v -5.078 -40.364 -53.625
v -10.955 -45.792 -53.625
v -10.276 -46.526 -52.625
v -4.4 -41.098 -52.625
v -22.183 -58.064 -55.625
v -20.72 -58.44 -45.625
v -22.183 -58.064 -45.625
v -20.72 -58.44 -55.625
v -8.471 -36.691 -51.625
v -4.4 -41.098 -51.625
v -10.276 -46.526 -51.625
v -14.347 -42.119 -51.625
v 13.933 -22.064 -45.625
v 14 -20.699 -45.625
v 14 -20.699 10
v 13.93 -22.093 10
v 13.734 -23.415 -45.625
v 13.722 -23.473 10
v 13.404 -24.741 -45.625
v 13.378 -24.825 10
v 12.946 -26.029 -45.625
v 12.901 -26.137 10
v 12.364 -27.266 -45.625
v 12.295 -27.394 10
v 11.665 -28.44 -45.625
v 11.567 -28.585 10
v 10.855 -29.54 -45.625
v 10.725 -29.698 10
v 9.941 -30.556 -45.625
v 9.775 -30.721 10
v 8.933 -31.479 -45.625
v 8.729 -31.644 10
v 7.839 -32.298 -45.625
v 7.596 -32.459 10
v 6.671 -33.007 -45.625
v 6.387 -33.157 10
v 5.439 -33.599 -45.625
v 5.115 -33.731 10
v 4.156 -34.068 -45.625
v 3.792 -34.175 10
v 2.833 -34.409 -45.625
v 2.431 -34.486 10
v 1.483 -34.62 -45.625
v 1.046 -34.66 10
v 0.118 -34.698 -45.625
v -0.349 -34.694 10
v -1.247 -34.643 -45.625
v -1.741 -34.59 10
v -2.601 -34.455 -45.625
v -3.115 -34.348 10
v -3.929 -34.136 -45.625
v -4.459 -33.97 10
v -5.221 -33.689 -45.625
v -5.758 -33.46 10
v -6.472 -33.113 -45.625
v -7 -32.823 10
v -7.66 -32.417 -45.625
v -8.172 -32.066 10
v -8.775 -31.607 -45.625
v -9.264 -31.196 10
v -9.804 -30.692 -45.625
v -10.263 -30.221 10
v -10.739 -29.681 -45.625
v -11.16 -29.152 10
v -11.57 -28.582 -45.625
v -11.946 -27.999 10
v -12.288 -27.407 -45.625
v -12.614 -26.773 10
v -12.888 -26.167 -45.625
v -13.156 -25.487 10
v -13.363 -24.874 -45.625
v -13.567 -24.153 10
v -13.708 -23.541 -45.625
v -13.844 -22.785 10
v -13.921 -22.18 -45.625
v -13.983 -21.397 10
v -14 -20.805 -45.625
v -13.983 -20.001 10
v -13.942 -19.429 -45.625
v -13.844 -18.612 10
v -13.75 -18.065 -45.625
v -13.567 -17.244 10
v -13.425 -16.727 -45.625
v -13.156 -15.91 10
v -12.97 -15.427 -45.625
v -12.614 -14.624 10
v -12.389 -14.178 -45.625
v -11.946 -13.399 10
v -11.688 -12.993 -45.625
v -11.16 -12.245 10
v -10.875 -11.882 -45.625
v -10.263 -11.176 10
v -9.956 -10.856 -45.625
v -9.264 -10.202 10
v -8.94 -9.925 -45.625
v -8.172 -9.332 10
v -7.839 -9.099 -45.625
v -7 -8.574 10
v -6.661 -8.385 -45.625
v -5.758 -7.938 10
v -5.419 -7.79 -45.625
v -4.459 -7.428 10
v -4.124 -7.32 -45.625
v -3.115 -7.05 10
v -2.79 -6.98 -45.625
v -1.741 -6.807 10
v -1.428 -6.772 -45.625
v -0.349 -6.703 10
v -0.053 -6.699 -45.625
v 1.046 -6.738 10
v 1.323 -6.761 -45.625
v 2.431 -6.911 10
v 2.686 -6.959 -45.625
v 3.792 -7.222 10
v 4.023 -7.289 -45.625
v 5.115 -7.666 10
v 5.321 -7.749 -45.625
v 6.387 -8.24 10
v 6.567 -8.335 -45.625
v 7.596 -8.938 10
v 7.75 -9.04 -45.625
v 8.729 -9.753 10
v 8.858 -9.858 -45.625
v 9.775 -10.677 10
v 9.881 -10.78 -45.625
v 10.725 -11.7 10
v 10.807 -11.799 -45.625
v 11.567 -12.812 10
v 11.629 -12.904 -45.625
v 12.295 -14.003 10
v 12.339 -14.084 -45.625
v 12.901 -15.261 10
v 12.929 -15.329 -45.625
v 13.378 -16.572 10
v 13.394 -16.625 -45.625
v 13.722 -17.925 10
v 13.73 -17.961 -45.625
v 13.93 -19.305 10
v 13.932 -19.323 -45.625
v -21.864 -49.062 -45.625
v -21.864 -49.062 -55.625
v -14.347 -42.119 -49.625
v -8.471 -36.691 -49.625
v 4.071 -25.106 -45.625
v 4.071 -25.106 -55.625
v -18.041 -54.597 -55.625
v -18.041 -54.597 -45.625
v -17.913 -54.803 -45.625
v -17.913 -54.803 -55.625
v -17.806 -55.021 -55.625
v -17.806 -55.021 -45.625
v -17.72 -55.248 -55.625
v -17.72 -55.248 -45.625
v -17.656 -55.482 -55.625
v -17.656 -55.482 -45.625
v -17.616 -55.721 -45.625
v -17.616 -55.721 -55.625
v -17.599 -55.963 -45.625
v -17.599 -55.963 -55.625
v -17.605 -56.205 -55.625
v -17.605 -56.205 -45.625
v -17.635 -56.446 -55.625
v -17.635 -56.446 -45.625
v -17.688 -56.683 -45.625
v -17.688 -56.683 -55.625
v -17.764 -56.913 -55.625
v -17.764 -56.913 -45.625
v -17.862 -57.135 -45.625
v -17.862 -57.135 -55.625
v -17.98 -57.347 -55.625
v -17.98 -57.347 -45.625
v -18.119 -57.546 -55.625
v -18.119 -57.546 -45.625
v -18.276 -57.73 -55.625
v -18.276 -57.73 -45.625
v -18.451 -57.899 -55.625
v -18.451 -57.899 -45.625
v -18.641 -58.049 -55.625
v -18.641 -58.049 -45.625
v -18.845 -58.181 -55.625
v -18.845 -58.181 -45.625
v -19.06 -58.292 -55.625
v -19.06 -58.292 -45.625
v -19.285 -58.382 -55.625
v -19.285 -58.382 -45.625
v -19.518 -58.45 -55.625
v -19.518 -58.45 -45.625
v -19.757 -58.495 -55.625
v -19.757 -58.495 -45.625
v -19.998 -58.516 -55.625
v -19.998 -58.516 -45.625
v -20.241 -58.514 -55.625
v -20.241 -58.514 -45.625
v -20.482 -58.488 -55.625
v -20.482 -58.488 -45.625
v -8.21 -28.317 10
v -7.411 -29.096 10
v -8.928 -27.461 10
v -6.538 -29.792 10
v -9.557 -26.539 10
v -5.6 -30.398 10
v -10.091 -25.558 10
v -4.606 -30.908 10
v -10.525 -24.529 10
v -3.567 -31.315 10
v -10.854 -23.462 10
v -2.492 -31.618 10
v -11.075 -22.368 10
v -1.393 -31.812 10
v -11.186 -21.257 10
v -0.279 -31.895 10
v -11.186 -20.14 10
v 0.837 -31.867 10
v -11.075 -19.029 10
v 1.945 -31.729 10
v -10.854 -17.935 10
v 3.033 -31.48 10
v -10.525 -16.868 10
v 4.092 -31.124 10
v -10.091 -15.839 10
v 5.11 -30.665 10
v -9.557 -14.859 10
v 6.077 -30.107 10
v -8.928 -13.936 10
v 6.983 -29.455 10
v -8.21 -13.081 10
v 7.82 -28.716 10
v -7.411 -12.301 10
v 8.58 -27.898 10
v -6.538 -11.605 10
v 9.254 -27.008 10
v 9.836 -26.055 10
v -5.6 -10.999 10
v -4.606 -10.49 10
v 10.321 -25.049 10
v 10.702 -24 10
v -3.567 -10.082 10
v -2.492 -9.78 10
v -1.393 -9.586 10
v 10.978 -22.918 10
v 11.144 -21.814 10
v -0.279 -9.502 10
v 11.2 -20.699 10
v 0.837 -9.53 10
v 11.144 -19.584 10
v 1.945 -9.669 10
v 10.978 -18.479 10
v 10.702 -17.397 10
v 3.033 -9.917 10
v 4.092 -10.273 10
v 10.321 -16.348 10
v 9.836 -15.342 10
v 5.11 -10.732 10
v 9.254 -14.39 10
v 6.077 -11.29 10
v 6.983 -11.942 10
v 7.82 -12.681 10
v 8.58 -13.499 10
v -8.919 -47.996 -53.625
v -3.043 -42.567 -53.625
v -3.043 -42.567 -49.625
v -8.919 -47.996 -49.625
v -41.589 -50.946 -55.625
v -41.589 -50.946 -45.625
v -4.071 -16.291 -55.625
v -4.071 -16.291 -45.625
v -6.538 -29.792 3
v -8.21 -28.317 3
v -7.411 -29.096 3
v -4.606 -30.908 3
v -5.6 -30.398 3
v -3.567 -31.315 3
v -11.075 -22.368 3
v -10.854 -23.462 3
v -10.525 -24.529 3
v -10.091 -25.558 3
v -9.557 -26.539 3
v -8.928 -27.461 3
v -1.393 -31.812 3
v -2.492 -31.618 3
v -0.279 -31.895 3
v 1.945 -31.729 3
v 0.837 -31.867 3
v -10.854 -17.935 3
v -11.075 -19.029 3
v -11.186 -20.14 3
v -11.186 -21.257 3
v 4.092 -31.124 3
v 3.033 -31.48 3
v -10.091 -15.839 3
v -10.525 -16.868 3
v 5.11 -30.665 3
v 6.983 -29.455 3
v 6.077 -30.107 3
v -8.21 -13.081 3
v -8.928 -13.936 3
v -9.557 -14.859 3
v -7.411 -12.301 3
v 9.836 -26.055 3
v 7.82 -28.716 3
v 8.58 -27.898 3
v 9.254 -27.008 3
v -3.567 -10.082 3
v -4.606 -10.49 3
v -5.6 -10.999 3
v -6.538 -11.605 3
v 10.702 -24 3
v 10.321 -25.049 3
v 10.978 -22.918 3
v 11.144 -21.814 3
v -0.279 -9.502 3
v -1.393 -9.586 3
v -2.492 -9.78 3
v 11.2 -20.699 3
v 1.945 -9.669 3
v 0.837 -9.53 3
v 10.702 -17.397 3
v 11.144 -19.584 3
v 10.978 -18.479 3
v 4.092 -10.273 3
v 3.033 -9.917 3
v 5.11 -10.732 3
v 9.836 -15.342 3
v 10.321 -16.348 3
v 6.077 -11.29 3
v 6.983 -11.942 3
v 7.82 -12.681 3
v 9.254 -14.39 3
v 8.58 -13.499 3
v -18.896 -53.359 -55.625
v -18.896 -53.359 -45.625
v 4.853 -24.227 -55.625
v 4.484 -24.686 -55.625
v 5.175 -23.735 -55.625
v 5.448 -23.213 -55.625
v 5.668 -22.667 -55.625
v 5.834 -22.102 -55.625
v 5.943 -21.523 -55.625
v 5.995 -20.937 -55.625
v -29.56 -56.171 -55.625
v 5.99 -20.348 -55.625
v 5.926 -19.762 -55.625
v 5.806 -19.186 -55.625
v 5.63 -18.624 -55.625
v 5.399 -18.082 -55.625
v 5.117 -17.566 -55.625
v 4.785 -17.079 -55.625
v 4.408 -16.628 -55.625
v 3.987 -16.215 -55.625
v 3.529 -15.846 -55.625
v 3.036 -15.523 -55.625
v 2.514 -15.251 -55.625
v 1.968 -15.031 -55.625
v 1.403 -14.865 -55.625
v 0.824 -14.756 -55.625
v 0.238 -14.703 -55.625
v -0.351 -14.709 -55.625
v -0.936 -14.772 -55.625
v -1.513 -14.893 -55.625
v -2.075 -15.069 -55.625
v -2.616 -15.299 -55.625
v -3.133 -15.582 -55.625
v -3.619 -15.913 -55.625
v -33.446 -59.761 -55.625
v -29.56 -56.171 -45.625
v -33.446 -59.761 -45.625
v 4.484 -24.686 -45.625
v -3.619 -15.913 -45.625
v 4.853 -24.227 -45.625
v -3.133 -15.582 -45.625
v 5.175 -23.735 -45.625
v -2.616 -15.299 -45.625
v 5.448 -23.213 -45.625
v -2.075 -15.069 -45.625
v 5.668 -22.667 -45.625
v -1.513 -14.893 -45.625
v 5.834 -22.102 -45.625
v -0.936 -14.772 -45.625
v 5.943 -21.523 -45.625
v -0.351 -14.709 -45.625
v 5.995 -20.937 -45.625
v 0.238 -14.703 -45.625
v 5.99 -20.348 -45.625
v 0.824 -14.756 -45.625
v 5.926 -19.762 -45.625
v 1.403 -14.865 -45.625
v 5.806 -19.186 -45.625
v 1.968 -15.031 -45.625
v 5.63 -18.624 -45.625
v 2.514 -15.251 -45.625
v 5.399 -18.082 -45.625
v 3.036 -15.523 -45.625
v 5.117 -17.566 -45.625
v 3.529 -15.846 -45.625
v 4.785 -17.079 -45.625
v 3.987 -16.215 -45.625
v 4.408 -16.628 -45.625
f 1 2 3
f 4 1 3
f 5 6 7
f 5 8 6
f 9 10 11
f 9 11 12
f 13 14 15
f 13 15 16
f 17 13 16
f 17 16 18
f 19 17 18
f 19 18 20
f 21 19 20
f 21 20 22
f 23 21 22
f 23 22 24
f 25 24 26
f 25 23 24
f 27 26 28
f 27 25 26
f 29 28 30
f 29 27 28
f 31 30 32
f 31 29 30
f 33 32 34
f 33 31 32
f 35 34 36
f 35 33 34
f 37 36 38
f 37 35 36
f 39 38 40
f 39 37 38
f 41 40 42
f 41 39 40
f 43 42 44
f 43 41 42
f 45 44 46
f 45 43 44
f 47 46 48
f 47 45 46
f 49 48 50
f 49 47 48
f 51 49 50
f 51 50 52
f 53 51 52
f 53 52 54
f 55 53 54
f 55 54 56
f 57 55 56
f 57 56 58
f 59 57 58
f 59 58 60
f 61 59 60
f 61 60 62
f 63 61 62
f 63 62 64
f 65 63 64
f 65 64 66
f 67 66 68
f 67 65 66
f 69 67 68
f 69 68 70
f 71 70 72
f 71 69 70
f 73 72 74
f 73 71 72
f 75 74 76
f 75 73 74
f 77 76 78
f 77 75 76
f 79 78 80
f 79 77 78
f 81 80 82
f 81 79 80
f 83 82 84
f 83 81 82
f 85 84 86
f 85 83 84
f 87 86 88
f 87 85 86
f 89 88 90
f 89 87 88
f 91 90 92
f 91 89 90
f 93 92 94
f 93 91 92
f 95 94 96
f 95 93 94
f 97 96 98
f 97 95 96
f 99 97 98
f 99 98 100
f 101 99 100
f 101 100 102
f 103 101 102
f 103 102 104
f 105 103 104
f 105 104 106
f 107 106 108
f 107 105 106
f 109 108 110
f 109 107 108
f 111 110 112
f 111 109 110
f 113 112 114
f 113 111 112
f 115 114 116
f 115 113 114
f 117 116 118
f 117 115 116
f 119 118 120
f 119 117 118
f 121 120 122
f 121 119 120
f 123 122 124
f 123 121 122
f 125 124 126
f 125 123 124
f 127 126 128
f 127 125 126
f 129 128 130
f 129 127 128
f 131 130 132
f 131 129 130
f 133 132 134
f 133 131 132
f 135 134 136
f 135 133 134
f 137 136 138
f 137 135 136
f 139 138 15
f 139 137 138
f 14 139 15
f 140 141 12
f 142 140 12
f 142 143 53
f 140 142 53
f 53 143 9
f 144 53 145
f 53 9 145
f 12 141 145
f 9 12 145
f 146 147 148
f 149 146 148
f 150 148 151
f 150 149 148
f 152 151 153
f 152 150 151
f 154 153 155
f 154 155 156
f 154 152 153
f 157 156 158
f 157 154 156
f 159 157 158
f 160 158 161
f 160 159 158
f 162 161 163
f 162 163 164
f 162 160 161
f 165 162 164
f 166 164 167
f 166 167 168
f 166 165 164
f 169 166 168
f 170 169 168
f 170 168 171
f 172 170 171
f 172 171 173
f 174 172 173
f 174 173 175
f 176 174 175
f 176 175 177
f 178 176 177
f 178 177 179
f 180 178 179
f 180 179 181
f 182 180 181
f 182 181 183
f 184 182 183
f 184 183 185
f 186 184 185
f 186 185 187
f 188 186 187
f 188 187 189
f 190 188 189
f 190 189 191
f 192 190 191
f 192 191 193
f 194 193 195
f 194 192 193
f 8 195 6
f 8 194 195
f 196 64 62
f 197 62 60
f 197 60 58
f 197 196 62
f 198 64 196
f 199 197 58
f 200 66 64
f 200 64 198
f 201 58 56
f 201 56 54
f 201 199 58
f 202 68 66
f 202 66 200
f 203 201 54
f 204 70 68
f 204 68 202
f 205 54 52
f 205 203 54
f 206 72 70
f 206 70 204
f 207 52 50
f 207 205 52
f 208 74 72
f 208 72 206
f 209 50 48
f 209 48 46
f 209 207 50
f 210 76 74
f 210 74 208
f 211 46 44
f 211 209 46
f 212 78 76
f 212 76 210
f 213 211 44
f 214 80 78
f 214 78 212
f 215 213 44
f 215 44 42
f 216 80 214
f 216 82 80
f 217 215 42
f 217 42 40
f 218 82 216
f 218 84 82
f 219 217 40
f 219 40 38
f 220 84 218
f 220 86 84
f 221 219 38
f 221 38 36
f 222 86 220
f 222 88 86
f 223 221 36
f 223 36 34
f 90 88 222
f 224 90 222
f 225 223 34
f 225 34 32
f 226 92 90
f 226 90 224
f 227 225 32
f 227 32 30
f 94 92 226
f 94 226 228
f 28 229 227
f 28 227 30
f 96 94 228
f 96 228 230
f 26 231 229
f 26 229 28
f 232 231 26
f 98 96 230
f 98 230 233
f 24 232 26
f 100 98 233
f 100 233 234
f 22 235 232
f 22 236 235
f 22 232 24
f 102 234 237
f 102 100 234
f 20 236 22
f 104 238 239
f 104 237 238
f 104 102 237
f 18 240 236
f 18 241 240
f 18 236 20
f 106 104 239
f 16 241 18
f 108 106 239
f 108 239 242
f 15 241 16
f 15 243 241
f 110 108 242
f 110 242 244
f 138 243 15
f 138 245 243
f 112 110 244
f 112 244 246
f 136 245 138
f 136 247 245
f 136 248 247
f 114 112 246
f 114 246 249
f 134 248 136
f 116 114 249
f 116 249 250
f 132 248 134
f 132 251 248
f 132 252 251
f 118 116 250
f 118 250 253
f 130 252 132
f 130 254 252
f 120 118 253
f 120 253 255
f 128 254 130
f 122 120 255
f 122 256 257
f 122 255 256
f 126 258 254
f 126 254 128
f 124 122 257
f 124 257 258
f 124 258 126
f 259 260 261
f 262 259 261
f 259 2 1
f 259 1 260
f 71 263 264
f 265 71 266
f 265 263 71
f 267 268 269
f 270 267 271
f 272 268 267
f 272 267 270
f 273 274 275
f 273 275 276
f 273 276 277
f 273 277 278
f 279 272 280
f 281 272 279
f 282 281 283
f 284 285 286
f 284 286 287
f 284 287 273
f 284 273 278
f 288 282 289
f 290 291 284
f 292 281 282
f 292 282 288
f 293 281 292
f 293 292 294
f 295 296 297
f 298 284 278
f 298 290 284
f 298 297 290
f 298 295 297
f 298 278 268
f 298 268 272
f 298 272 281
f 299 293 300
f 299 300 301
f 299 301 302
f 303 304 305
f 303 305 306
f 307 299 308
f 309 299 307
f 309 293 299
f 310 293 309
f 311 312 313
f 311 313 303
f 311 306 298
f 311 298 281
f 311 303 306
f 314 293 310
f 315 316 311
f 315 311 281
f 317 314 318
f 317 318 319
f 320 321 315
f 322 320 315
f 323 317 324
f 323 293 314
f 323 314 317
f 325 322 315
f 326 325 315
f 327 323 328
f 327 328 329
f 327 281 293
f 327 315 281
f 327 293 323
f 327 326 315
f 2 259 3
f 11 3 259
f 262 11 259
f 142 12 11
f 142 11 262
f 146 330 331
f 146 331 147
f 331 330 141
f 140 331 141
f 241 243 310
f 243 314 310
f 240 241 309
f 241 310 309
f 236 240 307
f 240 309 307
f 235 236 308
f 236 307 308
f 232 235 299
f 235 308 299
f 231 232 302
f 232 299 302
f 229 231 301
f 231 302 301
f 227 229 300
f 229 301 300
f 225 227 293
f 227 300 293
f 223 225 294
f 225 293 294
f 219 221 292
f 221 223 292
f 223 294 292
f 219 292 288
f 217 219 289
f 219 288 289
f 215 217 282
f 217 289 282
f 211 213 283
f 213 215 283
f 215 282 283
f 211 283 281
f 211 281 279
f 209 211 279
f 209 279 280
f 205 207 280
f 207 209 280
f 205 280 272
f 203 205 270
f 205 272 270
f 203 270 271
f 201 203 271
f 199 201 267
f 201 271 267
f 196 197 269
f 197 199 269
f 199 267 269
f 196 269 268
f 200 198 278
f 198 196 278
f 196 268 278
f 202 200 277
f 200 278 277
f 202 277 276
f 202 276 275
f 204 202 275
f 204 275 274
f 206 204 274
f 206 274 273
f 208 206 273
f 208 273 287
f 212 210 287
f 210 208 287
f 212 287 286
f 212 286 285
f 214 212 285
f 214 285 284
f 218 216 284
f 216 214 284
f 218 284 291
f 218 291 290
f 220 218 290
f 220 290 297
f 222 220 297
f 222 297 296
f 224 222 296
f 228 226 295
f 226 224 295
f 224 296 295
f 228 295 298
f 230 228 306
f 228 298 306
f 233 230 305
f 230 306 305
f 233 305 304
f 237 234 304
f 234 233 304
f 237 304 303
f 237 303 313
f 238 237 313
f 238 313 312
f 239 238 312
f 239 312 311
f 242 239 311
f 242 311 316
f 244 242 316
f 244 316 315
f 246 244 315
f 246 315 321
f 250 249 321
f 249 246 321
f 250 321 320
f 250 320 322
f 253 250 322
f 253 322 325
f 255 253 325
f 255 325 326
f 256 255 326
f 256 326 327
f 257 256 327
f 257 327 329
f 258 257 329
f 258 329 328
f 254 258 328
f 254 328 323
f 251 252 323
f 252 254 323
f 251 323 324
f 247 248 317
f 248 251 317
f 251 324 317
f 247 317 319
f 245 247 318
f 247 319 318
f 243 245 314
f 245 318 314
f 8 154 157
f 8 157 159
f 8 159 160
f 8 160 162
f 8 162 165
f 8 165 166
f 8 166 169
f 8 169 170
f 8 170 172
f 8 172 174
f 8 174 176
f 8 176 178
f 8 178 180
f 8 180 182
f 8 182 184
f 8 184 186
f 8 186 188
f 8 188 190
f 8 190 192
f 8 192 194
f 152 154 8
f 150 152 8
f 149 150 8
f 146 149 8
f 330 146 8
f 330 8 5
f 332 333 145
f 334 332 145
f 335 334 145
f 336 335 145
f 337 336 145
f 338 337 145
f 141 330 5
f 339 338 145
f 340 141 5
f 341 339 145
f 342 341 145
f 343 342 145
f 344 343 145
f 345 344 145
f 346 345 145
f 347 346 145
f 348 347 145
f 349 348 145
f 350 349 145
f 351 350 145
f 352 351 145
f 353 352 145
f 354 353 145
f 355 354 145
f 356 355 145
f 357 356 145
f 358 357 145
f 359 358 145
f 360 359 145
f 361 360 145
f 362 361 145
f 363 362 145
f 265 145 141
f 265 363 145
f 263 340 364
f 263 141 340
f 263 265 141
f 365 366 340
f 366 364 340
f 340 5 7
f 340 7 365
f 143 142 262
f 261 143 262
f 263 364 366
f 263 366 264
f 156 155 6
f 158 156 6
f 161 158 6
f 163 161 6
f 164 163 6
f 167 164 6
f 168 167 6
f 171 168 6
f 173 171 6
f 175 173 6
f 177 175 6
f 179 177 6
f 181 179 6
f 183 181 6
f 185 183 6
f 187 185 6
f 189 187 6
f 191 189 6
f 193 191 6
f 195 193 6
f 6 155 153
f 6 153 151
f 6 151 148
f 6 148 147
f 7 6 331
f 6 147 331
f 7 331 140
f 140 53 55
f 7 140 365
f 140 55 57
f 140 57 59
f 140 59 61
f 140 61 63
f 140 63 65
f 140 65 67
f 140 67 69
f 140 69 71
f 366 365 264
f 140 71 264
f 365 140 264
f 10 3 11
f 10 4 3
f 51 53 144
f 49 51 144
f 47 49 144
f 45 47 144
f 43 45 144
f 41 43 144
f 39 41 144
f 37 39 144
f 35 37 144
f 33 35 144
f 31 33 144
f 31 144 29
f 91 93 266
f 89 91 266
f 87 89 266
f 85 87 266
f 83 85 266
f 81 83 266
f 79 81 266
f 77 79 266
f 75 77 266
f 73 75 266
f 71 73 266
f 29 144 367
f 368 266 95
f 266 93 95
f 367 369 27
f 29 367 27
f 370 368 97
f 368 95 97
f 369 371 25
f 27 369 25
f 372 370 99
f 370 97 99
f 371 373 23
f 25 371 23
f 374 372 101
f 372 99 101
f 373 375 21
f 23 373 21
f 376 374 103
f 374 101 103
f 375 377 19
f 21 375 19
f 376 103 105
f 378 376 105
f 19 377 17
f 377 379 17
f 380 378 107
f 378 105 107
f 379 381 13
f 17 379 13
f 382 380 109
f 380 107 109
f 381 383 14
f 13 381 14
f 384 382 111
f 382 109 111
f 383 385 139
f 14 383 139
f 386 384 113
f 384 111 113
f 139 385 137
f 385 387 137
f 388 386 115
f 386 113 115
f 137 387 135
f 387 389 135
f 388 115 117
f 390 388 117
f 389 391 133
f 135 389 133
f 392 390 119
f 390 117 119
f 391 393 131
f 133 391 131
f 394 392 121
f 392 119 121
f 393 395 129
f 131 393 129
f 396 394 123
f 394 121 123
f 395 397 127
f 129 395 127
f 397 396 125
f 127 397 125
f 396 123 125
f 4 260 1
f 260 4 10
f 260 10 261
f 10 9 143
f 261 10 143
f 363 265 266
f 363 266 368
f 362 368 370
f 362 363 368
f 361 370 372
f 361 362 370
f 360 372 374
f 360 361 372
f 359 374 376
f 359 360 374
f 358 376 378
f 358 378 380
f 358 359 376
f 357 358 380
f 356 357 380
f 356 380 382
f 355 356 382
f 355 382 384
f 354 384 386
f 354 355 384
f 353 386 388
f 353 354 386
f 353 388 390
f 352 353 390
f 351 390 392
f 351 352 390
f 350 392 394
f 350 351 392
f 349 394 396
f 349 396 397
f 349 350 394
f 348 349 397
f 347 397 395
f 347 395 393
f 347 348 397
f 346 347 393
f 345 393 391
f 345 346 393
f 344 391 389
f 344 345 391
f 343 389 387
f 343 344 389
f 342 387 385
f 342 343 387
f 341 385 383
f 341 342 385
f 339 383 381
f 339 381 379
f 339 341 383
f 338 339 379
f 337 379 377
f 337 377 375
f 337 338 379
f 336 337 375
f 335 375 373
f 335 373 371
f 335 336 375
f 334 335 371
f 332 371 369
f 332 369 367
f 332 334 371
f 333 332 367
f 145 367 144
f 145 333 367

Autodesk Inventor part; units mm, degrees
ref_plane "Work Plane3" through (-4, -4, -10) normal (0, 0, -1) x (0, 1, 0)
ref_plane "Work Plane6" through (0, 0, -10) normal (0, 0, -1) x (-1, 0, 0)
ref_plane "Work Plane4" through (-20.0043, -85.0498, -55.625) normal (0, 0, -1) x (0, 1, 0)
ref_plane "Work Plane5" through (0, 0, -55.625) normal (0, 0, -1) x (-1, 0, 0)
sketch "Sketch6" plane through (0, 0, -55.625) normal (0, 0, -1) x (-1, 0, 0)
  arc A0 (75.4786, 4.8454) -> (74.2911, 5.1636) centre (74.7523, 4.5099) ccw projected
  arc A1 (56.7048, 9.4732) -> (74.2911, 5.1636) centre (67.3726, 14.9684) ccw projected
  line L0 (55.5232, 13.0737) -> (56.7048, 9.4732) projected
  arc A2 (55.5232, 13.0737) -> (41.5887, -50.9456) centre (67.3725, -23.0316) ccw projected
  line L1 (33.4464, -59.7606) -> (41.5887, -50.9456) projected
  arc A3 (33.4464, -59.7606) -> (104.1015, -56.9577) centre (67.3725, -23.0316) ccw projected
  line L2 (112.9165, -65.0999) -> (104.1015, -56.9577) projected
  arc A4 (112.9165, -65.0999) -> (124.3718, -47.4258) centre (67.3725, -23.0316) ccw projected
  line L3 (113.3397, -42.7043) -> (124.3718, -47.4258) projected
  arc A5 (113.3397, -42.7043) -> (116.0567, -34.4268) centre (67.3725, -23.0316) ccw projected
  arc A6 (116.0567, -34.4268) -> (112.8612, -32.4083) centre (114.1093, -33.971) ccw projected
  arc A7 (103.4777, -34.8812) -> (112.8612, -32.4083) centre (105.3725, -23.0317) ccw projected
  line L4 (99.8772, -33.6995) -> (103.4777, -34.8812) projected
  arc A8 (95.5677, -16.1132) -> (99.8772, -33.6995) centre (105.3725, -23.0317) ccw projected
  arc A9 (95.5677, -16.1132) -> (95.2495, -14.9257) centre (94.9141, -15.652) ccw projected
  arc A10 (88.3311, -2.9425) -> (95.2495, -14.9257) centre (100.2815, -4.0317) ccw projected
  arc A11 (88.3311, -2.9425) -> (87.4618, -2.0732) centre (87.5344, -2.8699) ccw projected
  arc A12 (75.4786, 4.8454) -> (87.4618, -2.0732) centre (86.3726, 9.8773) ccw projected
  circle A13 centre (67.3725, -23.0316) radius 18 projected
  line L5 (41.5887, -50.9456) -> (4.0711, -16.2912)
  line L6 (33.4464, -59.7606) -> (-4.0711, -25.1062)
  line L7 (-32.6275, -120.0316) -> (-32.6275, 19.9684) projected
  line L8 (-32.6275, 19.9684) -> (137.3725, 19.9684) projected
  line L9 (33.4464, -59.7606) -> (41.5887, -50.9456)
  circle A14 centre (0, -20.6987) radius 6
  arc A15 (18.8962, -53.3592) -> (15.9689, -49.5949) centre (16.8391, -51.9385) ccw
  line L10 (18.8962, -53.3592) -> (18.0411, -54.5974)
  arc A16 (18.0411, -54.5974) -> (20.7197, -58.4396) centre (20.0982, -56.0181) ccw
  line L11 (20.7197, -58.4396) -> (22.1832, -58.064)
  arc A17 (24.7026, -62.1127) -> (22.1832, -58.064) centre (22.8047, -60.4856) ccw
  line L12 (24.7026, -62.1127) -> (10.325, -78.8833)
  arc A18 (-4.734, -57.2821) -> (10.325, -78.8833) centre (0, -70.0316) ccw
  line L13 (-4.734, -57.2821) -> (15.9689, -49.5949)
  circle A19 centre (0, -70.0316) radius 5.6
  line L14 (18.8962, -53.3592) -> (21.8639, -49.062)
  line L15 (22.1832, -58.064) -> (29.5601, -56.1709)
extrude "Extrusion5" add sketch "Sketch6" against normal blind 10 contours L1 L6 A14 L5 | A14 | L15 L11 A16 L10 L14 L6
sketch "Sketch7" plane through (0, -20.6987, -45.625) normal (0, 0, 1) x (1, 0, 0)
  circle A0 centre (0, 0) radius 11.2
  circle A1 centre (0, 0) radius 14
  point P0 (0, 20.6987)
  dimension "d14" = 22.4
  dimension "d15" = 28
ref_plane "Work Plane7" through (-4, -24.6987, -7) normal (0, 0, -1) x (0, 1, 0)
extrude "Extrusion6" add sketch "Sketch7" along normal blind 48.625 contours A0 | A1
sketch "Sketch8" plane through (0, -20.6987, 3) normal (0, 0, 1) x (1, 0, 0)
  circle A0 centre (0, 0) radius 4
  circle A1 centre (0, 0) radius 11.2
  circle A2 centre (0, 0) radius 14 projected
  point P0 (0, 20.6987)
  dimension "d18" = 8
  dimension "d19" = 22.4
extrude "Extrusion7" add sketch "Sketch8" along normal blind 7 contours A2
ref_plane "Work Plane8" through (-11.409, -39.4049, -55.625) normal (-0.7345804, -0.6785217, 0) x (0, 0, 1)
sketch "Sketch10" plane through (-11.409, -39.4049, -55.625) normal (-0.7345804, -0.6785217, 0) x (0, 0, 1)
  line L0 (0, 0) -> (0, 12) projected
  line L1 (0, 12) -> (10, 12)
  line L2 (10, 12) -> (10, 0)
  line L3 (10, 0) -> (0, 0)
  line L4 (0, 0) -> (0, 12)
  line L5 (2, 0) -> (2, -8)
  line L6 (2, -8) -> (7, -8)
  line L7 (7, -8) -> (7, -4)
  line L8 (7, -4) -> (5, -6)
  line L9 (5, -6) -> (4, -6)
  line L10 (4, -6) -> (4, 0)
  line L11 (6, 0) -> (6, -8)
  line L12 (6, -8) -> (1, -8)
  line L13 (1, -8) -> (1, -4)
  line L14 (1, -4) -> (3, -6)
  line L15 (3, -6) -> (4, -6)
  point P0 (55.625, 21.2048)
  point P1 (6, 0)
  point P2 (2, -5)
  point P3 (6, -8)
  dimension "d23" = 8
  dimension "d24" = 5
  dimension "d25" = 4
  dimension "d26" = 45
  dimension "d27" = 2
  dimension "d28" = 2
  dimension "d29" = 2
extrude "Extrusion8" add sketch "Sketch10" along normal mid plane 8 contours L3 L11 L8 L9 L10 | L14 L15 L9 L8 L11 L6 L5
properties part number "ReverserClicker"
